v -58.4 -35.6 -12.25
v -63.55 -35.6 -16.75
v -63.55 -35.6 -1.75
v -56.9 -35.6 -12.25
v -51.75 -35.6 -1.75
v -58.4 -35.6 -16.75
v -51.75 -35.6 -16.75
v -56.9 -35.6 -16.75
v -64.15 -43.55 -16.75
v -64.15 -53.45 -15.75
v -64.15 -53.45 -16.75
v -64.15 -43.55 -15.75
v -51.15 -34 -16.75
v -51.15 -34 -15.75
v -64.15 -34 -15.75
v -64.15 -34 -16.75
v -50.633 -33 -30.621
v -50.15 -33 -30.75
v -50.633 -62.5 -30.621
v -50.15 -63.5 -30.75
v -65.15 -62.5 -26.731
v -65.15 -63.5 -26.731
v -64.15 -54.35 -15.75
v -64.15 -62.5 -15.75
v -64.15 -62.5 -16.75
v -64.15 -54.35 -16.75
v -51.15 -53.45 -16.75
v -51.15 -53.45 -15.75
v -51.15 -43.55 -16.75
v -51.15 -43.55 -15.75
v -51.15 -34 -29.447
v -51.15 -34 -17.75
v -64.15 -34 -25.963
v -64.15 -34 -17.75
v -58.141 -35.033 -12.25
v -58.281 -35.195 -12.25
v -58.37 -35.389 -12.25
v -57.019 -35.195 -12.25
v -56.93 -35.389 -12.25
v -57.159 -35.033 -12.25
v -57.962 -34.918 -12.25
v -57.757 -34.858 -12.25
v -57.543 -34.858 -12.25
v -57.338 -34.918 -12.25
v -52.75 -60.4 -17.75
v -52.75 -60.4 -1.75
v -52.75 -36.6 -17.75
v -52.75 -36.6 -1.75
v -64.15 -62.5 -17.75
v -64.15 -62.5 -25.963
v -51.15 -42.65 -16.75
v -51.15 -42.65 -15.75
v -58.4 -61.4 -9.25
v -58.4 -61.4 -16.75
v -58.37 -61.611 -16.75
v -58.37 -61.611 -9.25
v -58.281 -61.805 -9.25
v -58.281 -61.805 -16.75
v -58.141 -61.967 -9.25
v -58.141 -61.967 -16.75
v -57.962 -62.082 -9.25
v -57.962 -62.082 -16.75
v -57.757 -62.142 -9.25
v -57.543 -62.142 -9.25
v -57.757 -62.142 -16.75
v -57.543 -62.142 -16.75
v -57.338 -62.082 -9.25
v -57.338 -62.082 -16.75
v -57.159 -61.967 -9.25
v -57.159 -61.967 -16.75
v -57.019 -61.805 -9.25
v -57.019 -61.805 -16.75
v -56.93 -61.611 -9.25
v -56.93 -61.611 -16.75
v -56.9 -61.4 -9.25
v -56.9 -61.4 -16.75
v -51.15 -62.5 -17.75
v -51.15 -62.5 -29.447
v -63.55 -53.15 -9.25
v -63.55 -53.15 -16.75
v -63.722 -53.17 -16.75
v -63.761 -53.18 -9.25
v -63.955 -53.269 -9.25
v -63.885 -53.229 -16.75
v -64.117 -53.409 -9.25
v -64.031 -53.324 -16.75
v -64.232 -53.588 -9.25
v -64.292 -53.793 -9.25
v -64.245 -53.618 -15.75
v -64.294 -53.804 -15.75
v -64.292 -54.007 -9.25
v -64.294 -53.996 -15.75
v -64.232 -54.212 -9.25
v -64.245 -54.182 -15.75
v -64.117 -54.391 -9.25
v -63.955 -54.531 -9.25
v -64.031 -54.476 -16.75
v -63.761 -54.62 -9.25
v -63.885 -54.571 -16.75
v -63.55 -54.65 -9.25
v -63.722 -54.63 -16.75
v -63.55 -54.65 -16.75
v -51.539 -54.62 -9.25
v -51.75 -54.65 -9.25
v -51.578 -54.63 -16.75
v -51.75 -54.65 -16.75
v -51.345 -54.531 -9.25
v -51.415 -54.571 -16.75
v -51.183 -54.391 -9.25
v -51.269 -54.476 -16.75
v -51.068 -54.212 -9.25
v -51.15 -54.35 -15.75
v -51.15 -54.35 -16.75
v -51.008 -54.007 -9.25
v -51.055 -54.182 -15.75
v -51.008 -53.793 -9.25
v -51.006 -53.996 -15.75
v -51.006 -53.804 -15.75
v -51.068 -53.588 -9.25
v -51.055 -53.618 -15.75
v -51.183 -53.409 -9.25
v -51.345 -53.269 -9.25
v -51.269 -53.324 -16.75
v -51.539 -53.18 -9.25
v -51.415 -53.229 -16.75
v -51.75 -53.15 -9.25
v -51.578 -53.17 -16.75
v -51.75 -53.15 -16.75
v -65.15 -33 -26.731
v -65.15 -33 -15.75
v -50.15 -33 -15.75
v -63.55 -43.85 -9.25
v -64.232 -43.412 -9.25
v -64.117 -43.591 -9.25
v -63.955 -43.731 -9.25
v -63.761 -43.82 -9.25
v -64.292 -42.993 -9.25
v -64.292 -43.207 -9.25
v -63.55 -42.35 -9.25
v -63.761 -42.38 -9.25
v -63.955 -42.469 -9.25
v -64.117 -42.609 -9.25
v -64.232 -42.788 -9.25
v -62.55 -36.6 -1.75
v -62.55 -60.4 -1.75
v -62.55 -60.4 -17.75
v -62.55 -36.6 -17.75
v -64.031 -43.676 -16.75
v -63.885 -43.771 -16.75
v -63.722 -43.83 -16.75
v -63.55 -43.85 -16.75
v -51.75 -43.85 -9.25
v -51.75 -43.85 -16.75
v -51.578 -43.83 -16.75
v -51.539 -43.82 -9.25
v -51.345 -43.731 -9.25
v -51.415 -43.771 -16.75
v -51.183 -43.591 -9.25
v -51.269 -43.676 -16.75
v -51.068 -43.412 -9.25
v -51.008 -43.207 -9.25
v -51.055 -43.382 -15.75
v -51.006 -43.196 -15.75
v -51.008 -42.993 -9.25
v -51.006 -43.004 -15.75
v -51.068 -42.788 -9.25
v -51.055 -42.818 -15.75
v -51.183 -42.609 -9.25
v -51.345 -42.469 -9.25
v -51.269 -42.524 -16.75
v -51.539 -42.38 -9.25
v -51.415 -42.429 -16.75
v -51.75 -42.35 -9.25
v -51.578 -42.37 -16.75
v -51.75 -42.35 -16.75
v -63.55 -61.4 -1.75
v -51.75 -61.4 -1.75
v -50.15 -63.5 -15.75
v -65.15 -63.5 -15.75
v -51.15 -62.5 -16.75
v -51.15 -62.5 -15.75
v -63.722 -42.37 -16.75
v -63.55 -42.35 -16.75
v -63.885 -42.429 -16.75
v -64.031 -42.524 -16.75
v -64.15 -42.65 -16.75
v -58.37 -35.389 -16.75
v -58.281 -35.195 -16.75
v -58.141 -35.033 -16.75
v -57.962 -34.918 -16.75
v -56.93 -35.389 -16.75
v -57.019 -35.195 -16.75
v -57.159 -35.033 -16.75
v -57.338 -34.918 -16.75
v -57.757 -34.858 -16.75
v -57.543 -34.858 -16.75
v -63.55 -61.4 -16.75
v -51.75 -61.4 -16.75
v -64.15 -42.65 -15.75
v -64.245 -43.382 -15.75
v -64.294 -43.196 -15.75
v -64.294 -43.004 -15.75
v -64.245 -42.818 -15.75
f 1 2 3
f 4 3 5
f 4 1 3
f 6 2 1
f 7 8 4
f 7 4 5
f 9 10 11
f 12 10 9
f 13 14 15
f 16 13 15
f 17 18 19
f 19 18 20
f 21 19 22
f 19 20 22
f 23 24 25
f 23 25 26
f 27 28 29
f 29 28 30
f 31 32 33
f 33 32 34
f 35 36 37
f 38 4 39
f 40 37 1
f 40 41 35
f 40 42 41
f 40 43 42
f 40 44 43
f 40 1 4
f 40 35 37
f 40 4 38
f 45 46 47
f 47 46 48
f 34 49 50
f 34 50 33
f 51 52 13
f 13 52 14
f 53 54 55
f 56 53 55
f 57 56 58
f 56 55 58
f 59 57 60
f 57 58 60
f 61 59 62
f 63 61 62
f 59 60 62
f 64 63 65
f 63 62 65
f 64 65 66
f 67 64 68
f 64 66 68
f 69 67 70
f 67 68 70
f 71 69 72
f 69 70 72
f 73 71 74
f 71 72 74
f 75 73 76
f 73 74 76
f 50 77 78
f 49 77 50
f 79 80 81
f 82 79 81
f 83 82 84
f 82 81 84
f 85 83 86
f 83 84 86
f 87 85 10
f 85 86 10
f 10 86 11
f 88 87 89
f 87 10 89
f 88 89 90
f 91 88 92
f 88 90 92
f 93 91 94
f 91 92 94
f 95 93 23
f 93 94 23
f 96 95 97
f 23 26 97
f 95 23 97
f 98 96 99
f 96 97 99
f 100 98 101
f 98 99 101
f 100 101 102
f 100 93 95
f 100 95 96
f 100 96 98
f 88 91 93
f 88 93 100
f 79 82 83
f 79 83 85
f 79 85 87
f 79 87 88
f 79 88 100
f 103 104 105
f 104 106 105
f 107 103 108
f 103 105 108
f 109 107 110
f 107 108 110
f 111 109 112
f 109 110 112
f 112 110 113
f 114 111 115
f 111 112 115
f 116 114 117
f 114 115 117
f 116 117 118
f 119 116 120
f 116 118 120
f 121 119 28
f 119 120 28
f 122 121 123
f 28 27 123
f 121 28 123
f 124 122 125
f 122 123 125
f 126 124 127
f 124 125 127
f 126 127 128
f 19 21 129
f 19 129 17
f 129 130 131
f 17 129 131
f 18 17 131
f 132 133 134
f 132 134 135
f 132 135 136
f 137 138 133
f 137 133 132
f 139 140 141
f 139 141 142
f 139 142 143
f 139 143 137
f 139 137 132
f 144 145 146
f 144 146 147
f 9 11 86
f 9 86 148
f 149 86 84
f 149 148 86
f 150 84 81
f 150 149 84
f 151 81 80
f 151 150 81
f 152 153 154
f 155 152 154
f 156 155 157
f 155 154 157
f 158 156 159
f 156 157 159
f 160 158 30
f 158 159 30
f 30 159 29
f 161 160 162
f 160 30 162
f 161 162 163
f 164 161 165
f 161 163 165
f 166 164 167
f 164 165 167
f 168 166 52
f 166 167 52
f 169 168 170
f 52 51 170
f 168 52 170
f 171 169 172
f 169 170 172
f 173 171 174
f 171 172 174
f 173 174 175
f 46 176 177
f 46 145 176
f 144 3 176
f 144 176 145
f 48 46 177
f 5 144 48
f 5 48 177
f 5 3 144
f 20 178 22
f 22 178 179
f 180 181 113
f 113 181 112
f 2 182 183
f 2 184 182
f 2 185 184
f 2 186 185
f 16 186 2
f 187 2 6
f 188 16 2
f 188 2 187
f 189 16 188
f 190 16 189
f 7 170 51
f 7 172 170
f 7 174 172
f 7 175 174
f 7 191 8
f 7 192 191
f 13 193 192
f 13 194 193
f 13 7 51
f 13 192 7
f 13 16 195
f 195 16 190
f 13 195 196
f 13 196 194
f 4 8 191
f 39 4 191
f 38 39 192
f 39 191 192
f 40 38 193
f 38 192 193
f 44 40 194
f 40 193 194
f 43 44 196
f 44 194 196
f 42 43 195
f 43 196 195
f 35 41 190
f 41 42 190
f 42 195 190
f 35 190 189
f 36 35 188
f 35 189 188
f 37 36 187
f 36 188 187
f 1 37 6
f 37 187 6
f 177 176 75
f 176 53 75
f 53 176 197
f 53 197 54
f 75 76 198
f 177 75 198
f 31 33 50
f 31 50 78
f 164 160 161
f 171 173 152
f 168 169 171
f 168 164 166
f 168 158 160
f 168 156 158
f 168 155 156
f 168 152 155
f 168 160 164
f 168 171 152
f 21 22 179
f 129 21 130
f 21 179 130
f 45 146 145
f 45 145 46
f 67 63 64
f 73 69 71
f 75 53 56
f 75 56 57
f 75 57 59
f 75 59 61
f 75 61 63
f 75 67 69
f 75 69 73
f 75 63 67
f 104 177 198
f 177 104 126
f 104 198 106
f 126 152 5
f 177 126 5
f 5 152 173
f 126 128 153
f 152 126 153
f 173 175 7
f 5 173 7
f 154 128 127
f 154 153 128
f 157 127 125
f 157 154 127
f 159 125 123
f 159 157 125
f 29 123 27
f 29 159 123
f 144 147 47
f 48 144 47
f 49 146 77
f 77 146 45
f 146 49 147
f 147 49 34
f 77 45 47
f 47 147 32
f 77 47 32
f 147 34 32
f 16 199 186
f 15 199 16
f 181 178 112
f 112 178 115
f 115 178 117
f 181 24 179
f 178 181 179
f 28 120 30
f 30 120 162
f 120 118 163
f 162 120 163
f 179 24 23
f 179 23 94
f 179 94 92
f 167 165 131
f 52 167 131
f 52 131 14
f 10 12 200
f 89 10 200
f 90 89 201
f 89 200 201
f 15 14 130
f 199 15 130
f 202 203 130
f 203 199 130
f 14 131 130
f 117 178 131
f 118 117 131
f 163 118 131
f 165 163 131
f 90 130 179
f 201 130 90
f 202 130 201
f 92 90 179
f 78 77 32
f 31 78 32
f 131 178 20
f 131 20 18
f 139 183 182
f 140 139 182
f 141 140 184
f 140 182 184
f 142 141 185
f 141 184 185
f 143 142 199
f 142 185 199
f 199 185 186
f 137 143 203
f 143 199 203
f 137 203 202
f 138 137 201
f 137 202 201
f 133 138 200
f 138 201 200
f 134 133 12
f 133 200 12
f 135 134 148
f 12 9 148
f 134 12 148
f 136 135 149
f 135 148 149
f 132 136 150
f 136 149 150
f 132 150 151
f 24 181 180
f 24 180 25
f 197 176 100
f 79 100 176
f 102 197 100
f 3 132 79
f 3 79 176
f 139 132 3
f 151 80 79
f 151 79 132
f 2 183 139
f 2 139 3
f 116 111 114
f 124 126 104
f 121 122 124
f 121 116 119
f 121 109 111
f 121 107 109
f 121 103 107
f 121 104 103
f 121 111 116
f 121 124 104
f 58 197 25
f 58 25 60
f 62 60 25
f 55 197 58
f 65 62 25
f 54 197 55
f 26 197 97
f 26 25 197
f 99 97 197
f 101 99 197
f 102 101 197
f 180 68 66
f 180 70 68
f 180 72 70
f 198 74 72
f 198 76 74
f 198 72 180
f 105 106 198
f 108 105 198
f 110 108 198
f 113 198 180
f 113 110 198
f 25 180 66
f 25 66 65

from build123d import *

# Parameters (mm, degrees)
SKETCH061_W        = 11.8
SKETCH061_H        = 25.8
SKETCH061_W_2      = 9.8
SKETCH061_H_2      = 23.8
PAD031_DEPTH       = 15
SKETCH062_W        = 15
SKETCH062_H        = 30.5
SKETCH062_W_2      = 9.8
SKETCH062_H_2      = 23.8
PAD032_DEPTH       = 1
SKETCH063_W        = 15
SKETCH063_H        = 30.5
SKETCH063_W_2      = 13
SKETCH063_H_2      = 28.5
PAD033_DEPTH       = 15
POCKET007016_DEPTH = 30.501
SKETCH081_R        = 0.75
PAD042_DEPTH       = 7.5
SKETCH065_W        = 15.029142
SKETCH065_H        = 29.5
PAD034_DEPTH       = 1
SKETCH066_W        = 13.8
SKETCH066_H        = 5
POCKET007017_DEPTH = 3


with BuildPart() as part:
    # Sketch061 → Pad031 (new body)
    with BuildSketch(Plane.XY):
        with Locations((-57.65, -16.5)):
            Rectangle(SKETCH061_W, SKETCH061_H)
        with Locations((-57.65, -16.5)):
            Rectangle(SKETCH061_W_2, SKETCH061_H_2, mode=Mode.SUBTRACT)
    extrude(amount=PAD031_DEPTH)

    # Sketch062 → Pad032 (join)
    with BuildSketch(Plane.XY):
        with Locations((-57.65, -16.25)):
            Rectangle(SKETCH062_W, SKETCH062_H)
        with Locations((-57.65, -16.5)):
            Rectangle(SKETCH062_W_2, SKETCH062_H_2, mode=Mode.SUBTRACT)
    extrude(amount=-PAD032_DEPTH)

    # Sketch063 (on DatumPlane) → Pad033 (join)
    with BuildSketch(Plane(origin=(0, 0, 1), x_dir=(-1, 0, 0), z_dir=(0, 0, -1))):
        with Locations((57.65, -16.25)):
            Rectangle(SKETCH063_W, SKETCH063_H)
        with Locations((57.65, -16.25)):
            Rectangle(SKETCH063_W_2, SKETCH063_H_2, mode=Mode.SUBTRACT)
    extrude(amount=PAD033_DEPTH)

    # Sketch064 (on DatumPlane) → Pocket007016 (cut, through all)
    with BuildSketch(Plane(origin=(-65.15, -31.5, 1), x_dir=(1, 0, 0), z_dir=(0, -1, 0))):
        Polygon((15, -15), (0, -10.980762), (0, -15), align=None)
    extrude(amount=-POCKET007016_DEPTH, mode=Mode.SUBTRACT)

    # Sketch081 (on DatumPlane) → Pad042 (join)
    with BuildSketch(Plane.XY):
        with Locations((-57.65, -3.6)):
            Circle(SKETCH081_R)
        with Locations((-57.65, -29.4)):
            Circle(SKETCH081_R)
        with Locations((-51.75, -21.9)):
            Circle(SKETCH081_R)
        with Locations((-51.75, -11.1)):
            Circle(SKETCH081_R)
        with Locations((-63.55, -11.1)):
            Circle(SKETCH081_R)
        with Locations((-63.55, -21.9)):
            Circle(SKETCH081_R)
    extrude(amount=PAD042_DEPTH)

    # Sketch065 (on Face37 of Pocket007016) → Pad034 (join)
    with BuildSketch(Plane(origin=(-6.859413, 0, -25.599678), x_dir=(0.965926, 0, -0.258819), z_dir=(-0.258819, 0, -0.965926))):
        with Locations((-52.832285, 15.75)):
            Rectangle(SKETCH065_W, SKETCH065_H)
    extrude(amount=-PAD034_DEPTH)

    # Sketch066 (on Face36 of Pad034) → Pocket007017 (cut)
    with BuildSketch(Plane.XY.offset(7.5)):
        with Locations((-57.65, -1.1)):
            Rectangle(SKETCH066_W, SKETCH066_H)
    extrude(amount=-POCKET007017_DEPTH, mode=Mode.SUBTRACT)


with BuildPart() as part_1:
    # Body004 placement: moved
    add(part.part.moved(Location((0, -32, -16.75))))


solid = part_1.part
